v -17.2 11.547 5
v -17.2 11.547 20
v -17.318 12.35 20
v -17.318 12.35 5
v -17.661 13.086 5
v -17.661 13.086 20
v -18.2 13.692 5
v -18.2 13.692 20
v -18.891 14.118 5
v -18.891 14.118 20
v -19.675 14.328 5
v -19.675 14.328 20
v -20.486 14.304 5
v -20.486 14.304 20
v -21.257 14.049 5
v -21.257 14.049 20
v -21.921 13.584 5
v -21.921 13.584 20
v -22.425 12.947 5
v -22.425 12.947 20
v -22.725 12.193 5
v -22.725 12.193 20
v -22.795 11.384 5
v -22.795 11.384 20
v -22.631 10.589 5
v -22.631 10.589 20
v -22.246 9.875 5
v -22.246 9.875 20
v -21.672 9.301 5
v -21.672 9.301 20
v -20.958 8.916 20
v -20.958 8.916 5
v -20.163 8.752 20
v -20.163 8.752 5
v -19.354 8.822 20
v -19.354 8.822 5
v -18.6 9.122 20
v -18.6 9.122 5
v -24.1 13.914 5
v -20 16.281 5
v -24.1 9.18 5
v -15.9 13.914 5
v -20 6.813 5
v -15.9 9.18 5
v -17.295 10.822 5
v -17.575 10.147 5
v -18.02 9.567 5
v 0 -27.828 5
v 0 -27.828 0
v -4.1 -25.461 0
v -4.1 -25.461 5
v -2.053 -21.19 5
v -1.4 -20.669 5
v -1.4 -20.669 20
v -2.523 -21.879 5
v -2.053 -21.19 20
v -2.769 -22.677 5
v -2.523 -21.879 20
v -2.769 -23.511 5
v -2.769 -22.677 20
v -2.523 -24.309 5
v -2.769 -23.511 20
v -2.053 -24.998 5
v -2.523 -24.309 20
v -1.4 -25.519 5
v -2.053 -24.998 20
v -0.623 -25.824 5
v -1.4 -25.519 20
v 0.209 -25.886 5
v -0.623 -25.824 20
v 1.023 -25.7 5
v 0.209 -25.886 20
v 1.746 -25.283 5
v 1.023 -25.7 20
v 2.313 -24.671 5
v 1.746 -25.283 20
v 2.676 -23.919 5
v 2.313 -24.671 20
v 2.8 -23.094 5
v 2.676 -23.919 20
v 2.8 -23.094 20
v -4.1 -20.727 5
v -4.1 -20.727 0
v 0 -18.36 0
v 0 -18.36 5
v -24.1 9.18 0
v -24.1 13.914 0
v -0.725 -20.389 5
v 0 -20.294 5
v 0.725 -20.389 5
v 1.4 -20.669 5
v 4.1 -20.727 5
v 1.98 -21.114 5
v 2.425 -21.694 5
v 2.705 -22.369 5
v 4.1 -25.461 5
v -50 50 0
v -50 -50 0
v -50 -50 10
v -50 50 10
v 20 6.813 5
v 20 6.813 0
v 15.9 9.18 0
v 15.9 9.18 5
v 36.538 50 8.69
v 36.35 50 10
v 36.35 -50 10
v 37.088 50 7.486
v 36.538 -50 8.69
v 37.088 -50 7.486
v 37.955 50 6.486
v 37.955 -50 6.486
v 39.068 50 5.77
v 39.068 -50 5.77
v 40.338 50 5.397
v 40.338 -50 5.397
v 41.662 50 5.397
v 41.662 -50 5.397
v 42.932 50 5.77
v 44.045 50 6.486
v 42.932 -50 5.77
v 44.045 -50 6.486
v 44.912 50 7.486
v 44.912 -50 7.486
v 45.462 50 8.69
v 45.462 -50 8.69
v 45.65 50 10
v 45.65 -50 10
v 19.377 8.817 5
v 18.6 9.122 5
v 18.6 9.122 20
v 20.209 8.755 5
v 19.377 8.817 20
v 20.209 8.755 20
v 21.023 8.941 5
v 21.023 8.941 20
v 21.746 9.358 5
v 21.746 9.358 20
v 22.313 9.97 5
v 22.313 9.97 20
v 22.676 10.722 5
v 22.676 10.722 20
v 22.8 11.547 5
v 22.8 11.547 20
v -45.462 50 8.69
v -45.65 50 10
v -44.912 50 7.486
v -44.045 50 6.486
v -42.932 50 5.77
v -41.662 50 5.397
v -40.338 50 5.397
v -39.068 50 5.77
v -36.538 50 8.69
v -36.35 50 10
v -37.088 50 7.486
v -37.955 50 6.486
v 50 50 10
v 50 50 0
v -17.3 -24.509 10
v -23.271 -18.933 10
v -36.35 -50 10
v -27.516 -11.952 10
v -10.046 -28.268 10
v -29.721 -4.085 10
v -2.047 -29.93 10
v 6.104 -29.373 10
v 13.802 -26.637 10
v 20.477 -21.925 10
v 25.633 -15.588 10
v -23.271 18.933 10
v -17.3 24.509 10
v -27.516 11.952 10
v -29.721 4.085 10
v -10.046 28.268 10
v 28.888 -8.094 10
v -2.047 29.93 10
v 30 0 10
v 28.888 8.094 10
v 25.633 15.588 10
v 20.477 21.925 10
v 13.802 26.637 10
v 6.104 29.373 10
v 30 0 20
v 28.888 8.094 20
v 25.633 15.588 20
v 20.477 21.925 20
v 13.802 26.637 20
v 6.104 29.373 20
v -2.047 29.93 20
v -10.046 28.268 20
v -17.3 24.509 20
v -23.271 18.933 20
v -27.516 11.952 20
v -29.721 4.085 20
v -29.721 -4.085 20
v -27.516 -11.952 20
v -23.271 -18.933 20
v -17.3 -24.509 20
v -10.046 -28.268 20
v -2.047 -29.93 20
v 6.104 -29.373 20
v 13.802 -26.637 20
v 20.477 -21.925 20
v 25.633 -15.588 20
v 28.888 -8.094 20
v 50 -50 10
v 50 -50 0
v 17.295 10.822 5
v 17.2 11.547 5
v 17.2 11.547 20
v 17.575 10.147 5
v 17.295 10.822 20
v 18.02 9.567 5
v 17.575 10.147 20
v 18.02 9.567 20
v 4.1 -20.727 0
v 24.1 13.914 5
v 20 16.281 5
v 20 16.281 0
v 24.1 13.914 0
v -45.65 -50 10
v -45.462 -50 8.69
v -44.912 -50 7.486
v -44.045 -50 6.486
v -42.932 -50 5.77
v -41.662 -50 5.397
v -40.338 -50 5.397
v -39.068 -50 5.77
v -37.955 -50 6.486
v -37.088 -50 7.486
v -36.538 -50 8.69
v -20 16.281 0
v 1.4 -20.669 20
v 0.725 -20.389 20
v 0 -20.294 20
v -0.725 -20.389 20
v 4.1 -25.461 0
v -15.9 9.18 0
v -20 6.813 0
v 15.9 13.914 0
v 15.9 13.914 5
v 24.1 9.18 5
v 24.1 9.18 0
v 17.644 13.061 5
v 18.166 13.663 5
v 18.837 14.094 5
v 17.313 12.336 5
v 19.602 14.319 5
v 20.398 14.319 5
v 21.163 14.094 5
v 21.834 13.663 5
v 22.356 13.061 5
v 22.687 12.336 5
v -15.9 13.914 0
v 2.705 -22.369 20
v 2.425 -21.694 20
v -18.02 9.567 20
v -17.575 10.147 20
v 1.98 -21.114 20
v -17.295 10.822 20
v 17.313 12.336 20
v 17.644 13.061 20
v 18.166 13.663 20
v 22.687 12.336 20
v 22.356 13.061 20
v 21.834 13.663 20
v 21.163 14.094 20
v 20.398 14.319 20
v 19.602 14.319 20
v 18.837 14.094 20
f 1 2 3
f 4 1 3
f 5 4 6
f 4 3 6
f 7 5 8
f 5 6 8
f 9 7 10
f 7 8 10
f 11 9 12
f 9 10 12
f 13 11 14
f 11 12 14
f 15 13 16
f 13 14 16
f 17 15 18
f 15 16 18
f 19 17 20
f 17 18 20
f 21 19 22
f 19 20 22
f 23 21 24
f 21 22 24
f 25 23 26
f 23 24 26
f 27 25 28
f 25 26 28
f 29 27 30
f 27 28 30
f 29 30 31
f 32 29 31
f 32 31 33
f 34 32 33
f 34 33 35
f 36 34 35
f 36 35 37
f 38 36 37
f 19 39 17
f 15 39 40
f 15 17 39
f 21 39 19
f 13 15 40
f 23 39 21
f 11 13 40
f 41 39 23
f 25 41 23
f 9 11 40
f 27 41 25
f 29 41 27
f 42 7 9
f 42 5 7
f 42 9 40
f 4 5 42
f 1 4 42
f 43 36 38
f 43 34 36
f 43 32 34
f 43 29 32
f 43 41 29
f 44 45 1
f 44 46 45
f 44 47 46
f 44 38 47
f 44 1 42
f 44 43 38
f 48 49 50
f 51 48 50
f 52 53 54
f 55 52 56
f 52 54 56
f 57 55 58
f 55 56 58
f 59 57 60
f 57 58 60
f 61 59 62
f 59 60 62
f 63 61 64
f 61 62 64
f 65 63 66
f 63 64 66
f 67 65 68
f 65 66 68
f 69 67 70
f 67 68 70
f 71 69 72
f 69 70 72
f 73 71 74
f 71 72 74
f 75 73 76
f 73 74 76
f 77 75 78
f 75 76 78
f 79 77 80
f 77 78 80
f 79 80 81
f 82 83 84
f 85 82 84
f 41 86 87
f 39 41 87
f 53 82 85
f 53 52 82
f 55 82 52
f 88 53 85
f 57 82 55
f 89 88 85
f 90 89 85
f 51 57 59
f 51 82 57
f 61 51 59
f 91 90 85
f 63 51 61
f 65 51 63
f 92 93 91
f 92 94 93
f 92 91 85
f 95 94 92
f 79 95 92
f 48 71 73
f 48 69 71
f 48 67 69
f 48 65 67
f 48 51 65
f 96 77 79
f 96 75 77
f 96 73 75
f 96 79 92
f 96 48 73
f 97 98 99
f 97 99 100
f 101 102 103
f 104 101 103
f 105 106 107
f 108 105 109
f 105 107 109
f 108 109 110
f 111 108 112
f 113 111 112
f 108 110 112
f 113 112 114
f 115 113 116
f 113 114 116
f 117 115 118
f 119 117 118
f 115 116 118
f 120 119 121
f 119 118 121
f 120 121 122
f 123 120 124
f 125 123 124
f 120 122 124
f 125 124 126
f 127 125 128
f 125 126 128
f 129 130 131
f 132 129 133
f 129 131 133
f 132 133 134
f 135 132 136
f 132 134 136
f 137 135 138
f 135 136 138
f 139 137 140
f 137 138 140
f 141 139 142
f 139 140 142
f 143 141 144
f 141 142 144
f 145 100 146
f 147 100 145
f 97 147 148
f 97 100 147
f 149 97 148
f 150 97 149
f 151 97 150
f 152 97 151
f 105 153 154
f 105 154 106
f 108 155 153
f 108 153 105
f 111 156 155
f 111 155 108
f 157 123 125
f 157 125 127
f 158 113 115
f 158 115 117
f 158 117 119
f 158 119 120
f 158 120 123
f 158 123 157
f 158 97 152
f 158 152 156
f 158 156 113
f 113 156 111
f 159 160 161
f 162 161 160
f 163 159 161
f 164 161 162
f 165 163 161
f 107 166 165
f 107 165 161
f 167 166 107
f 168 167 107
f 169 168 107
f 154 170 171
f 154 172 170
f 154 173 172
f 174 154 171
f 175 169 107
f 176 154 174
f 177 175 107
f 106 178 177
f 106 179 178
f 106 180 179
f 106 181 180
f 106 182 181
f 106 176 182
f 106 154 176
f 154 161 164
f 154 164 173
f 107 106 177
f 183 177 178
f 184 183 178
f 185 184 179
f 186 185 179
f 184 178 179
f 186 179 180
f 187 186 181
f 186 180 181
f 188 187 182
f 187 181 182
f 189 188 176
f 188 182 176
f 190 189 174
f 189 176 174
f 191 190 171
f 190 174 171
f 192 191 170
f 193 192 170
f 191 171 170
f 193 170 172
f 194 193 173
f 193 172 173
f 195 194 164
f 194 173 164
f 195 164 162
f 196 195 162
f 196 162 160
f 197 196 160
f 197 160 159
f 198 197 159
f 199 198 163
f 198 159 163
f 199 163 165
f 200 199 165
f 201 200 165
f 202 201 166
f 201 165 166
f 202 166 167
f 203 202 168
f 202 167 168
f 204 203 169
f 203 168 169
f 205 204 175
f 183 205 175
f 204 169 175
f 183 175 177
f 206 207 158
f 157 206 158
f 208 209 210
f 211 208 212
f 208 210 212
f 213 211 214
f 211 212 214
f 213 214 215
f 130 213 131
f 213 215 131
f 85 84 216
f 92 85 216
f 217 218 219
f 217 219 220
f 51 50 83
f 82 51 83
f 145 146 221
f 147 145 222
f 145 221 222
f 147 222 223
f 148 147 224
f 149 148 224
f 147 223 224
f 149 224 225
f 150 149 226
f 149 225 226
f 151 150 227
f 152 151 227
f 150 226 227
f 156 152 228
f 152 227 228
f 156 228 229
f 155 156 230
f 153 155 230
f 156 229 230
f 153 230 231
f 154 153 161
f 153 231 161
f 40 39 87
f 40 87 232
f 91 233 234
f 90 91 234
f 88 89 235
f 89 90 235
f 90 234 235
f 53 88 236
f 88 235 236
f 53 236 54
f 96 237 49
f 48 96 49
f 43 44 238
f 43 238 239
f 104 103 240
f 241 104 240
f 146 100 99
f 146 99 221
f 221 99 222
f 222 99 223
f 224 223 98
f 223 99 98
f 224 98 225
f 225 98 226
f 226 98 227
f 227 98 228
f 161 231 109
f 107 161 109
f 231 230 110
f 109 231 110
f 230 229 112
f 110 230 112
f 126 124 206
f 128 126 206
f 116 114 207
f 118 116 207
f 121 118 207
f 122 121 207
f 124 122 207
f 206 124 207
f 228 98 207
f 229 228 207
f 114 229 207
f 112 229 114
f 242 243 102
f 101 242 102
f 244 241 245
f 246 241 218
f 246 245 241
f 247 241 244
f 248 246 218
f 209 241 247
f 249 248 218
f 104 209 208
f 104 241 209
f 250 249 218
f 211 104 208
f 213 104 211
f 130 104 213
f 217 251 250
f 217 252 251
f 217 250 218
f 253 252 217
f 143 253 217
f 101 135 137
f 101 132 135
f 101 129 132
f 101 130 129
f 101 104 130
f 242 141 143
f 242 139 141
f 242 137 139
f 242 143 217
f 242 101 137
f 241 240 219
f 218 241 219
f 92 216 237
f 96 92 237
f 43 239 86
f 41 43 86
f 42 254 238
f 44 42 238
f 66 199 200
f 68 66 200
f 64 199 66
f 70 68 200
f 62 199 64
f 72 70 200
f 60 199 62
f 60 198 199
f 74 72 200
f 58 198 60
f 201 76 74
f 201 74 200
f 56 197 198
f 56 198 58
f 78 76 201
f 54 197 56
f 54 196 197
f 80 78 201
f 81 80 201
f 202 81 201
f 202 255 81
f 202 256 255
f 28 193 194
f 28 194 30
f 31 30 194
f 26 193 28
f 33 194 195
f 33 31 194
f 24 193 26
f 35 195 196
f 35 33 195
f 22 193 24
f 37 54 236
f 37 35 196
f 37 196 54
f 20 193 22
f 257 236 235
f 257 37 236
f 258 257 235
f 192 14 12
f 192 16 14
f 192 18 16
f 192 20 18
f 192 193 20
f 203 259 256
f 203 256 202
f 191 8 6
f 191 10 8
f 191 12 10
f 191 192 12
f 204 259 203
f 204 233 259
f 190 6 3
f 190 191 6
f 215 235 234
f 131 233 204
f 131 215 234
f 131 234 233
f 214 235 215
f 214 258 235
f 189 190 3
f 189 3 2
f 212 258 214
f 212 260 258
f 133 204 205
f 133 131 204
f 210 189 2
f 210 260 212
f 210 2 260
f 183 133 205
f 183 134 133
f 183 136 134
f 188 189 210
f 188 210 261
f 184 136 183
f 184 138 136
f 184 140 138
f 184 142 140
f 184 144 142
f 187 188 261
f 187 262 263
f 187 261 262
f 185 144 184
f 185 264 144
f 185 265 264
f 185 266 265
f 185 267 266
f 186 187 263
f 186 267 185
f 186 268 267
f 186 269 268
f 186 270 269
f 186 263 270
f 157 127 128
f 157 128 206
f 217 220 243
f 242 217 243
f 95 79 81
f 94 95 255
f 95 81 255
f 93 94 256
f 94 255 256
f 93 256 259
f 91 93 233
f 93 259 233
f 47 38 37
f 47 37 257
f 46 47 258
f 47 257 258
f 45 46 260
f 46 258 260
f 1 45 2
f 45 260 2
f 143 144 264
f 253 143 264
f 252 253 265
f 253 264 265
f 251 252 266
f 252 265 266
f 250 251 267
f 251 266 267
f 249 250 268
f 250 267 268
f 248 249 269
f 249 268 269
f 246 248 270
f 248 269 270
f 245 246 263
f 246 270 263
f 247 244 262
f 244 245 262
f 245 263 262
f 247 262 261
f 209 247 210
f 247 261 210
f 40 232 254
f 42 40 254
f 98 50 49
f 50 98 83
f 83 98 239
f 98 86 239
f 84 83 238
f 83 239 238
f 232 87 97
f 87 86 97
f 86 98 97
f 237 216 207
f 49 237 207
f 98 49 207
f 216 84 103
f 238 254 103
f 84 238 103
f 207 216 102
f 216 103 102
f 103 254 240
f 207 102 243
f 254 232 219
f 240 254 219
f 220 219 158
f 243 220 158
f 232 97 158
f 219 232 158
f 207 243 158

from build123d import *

# Parameters (mm, degrees)
F0_W     = 100
F0_H     = 100
F1_DEPTH = 10
F2_R     = 4.65
F3_DEPTH = 100.001
F4_R     = 30
F5_DEPTH = 10
F7_DEPTH = 20.001
F8_R     = 2.8
F9_DEPTH = 5


with BuildPart() as f1:
    # F0 (on Top) → F1 (new body)
    with BuildSketch(Plane.XY):
        Rectangle(F0_W, F0_H)
    extrude(amount=F1_DEPTH)

    # F2 (on face) → F3 (cut, through all)
    with BuildSketch(Plane.XZ.offset(50)):
        with Locations((-41, 10)):
            Circle(F2_R)
        with Locations((41, 10)):
            Circle(F2_R)
    extrude(amount=-F3_DEPTH, mode=Mode.SUBTRACT)

    # F4 (on face) → F5 (join)
    with BuildSketch(Plane.XY.offset(10)):
        Circle(F4_R)
    extrude(amount=F5_DEPTH)

    # F6 (on face) → F7 (cut, through all)
    with BuildSketch(Plane.XY.offset(20)):
        with BuildLine():
            ThreePointArc((-18.6, 9.122134), (-17.575129, 10.147005), (-17.2, 11.547005))
            Line((-17.2, 11.547005), (-20, 11.547005))
            Line((-20, 11.547005), (-18.6, 9.122134))
        make_face()
        with BuildLine():
            Line((-20, 11.547005), (-17.2, 11.547005))
            ThreePointArc((-17.2, 11.547005), (-22.424871, 12.947005), (-18.6, 9.122134))
            Line((-18.6, 9.122134), (-20, 11.547005))
        make_face()
        with BuildLine():
            Line((18.6, 9.122134), (20, 11.547005))
            Line((20, 11.547005), (17.2, 11.547005))
            ThreePointArc((17.2, 11.547005), (17.575129, 10.147005), (18.6, 9.122134))
        make_face()
        with BuildLine():
            Line((17.2, 11.547005), (20, 11.547005))
            Line((20, 11.547005), (18.6, 9.122134))
            ThreePointArc((18.6, 9.122134), (21.4, 9.122134), (22.8, 11.547005))
            ThreePointArc((22.8, 11.547005), (20, 14.347005), (17.2, 11.547005))
        make_face()
        with BuildLine():
            Line((0, -23.094011), (1.4, -20.66914))
            ThreePointArc((1.4, -20.66914), (0, -20.294011), (-1.4, -20.66914))
            Line((-1.4, -20.66914), (0, -23.094011))
        make_face()
        with BuildLine():
            ThreePointArc((2.8, -23.094011), (2.424871, -21.694011), (1.4, -20.66914))
            Line((1.4, -20.66914), (0, -23.094011))
            Line((0, -23.094011), (-1.4, -20.66914))
            ThreePointArc((-1.4, -20.66914), (-1.4, -25.518882), (2.8, -23.094011))
        make_face()
    extrude(amount=-F7_DEPTH, mode=Mode.SUBTRACT)

    # F8 (on face) → F9 (cut)
    with BuildSketch(Plane(origin=(0, 0, 0), x_dir=(1, 0, 0), z_dir=(0, 0, -1))):
        Polygon((0, 18.359739), (4.1, 20.726875), (4.1, 25.461147), (0, 27.828283), (-4.1, 25.461147), (-4.1, 20.726875), align=None)
        with Locations((0, 23.094011)):
            Circle(F8_R, mode=Mode.SUBTRACT)
        Polygon((-20, -16.281278), (-15.9, -13.914141), (-15.9, -9.179869), (-20, -6.812733), (-24.1, -9.179869), (-24.1, -13.914141), align=None)
        with Locations((-20, -11.547005)):
            Circle(F8_R, mode=Mode.SUBTRACT)
        Polygon((20, -16.281278), (24.1, -13.914141), (24.1, -9.179869), (20, -6.812733), (15.9, -9.179869), (15.9, -13.914141), align=None)
        with Locations((20, -11.547005)):
            Circle(F8_R, mode=Mode.SUBTRACT)
    extrude(amount=-F9_DEPTH, mode=Mode.SUBTRACT)


solid = f1.part
